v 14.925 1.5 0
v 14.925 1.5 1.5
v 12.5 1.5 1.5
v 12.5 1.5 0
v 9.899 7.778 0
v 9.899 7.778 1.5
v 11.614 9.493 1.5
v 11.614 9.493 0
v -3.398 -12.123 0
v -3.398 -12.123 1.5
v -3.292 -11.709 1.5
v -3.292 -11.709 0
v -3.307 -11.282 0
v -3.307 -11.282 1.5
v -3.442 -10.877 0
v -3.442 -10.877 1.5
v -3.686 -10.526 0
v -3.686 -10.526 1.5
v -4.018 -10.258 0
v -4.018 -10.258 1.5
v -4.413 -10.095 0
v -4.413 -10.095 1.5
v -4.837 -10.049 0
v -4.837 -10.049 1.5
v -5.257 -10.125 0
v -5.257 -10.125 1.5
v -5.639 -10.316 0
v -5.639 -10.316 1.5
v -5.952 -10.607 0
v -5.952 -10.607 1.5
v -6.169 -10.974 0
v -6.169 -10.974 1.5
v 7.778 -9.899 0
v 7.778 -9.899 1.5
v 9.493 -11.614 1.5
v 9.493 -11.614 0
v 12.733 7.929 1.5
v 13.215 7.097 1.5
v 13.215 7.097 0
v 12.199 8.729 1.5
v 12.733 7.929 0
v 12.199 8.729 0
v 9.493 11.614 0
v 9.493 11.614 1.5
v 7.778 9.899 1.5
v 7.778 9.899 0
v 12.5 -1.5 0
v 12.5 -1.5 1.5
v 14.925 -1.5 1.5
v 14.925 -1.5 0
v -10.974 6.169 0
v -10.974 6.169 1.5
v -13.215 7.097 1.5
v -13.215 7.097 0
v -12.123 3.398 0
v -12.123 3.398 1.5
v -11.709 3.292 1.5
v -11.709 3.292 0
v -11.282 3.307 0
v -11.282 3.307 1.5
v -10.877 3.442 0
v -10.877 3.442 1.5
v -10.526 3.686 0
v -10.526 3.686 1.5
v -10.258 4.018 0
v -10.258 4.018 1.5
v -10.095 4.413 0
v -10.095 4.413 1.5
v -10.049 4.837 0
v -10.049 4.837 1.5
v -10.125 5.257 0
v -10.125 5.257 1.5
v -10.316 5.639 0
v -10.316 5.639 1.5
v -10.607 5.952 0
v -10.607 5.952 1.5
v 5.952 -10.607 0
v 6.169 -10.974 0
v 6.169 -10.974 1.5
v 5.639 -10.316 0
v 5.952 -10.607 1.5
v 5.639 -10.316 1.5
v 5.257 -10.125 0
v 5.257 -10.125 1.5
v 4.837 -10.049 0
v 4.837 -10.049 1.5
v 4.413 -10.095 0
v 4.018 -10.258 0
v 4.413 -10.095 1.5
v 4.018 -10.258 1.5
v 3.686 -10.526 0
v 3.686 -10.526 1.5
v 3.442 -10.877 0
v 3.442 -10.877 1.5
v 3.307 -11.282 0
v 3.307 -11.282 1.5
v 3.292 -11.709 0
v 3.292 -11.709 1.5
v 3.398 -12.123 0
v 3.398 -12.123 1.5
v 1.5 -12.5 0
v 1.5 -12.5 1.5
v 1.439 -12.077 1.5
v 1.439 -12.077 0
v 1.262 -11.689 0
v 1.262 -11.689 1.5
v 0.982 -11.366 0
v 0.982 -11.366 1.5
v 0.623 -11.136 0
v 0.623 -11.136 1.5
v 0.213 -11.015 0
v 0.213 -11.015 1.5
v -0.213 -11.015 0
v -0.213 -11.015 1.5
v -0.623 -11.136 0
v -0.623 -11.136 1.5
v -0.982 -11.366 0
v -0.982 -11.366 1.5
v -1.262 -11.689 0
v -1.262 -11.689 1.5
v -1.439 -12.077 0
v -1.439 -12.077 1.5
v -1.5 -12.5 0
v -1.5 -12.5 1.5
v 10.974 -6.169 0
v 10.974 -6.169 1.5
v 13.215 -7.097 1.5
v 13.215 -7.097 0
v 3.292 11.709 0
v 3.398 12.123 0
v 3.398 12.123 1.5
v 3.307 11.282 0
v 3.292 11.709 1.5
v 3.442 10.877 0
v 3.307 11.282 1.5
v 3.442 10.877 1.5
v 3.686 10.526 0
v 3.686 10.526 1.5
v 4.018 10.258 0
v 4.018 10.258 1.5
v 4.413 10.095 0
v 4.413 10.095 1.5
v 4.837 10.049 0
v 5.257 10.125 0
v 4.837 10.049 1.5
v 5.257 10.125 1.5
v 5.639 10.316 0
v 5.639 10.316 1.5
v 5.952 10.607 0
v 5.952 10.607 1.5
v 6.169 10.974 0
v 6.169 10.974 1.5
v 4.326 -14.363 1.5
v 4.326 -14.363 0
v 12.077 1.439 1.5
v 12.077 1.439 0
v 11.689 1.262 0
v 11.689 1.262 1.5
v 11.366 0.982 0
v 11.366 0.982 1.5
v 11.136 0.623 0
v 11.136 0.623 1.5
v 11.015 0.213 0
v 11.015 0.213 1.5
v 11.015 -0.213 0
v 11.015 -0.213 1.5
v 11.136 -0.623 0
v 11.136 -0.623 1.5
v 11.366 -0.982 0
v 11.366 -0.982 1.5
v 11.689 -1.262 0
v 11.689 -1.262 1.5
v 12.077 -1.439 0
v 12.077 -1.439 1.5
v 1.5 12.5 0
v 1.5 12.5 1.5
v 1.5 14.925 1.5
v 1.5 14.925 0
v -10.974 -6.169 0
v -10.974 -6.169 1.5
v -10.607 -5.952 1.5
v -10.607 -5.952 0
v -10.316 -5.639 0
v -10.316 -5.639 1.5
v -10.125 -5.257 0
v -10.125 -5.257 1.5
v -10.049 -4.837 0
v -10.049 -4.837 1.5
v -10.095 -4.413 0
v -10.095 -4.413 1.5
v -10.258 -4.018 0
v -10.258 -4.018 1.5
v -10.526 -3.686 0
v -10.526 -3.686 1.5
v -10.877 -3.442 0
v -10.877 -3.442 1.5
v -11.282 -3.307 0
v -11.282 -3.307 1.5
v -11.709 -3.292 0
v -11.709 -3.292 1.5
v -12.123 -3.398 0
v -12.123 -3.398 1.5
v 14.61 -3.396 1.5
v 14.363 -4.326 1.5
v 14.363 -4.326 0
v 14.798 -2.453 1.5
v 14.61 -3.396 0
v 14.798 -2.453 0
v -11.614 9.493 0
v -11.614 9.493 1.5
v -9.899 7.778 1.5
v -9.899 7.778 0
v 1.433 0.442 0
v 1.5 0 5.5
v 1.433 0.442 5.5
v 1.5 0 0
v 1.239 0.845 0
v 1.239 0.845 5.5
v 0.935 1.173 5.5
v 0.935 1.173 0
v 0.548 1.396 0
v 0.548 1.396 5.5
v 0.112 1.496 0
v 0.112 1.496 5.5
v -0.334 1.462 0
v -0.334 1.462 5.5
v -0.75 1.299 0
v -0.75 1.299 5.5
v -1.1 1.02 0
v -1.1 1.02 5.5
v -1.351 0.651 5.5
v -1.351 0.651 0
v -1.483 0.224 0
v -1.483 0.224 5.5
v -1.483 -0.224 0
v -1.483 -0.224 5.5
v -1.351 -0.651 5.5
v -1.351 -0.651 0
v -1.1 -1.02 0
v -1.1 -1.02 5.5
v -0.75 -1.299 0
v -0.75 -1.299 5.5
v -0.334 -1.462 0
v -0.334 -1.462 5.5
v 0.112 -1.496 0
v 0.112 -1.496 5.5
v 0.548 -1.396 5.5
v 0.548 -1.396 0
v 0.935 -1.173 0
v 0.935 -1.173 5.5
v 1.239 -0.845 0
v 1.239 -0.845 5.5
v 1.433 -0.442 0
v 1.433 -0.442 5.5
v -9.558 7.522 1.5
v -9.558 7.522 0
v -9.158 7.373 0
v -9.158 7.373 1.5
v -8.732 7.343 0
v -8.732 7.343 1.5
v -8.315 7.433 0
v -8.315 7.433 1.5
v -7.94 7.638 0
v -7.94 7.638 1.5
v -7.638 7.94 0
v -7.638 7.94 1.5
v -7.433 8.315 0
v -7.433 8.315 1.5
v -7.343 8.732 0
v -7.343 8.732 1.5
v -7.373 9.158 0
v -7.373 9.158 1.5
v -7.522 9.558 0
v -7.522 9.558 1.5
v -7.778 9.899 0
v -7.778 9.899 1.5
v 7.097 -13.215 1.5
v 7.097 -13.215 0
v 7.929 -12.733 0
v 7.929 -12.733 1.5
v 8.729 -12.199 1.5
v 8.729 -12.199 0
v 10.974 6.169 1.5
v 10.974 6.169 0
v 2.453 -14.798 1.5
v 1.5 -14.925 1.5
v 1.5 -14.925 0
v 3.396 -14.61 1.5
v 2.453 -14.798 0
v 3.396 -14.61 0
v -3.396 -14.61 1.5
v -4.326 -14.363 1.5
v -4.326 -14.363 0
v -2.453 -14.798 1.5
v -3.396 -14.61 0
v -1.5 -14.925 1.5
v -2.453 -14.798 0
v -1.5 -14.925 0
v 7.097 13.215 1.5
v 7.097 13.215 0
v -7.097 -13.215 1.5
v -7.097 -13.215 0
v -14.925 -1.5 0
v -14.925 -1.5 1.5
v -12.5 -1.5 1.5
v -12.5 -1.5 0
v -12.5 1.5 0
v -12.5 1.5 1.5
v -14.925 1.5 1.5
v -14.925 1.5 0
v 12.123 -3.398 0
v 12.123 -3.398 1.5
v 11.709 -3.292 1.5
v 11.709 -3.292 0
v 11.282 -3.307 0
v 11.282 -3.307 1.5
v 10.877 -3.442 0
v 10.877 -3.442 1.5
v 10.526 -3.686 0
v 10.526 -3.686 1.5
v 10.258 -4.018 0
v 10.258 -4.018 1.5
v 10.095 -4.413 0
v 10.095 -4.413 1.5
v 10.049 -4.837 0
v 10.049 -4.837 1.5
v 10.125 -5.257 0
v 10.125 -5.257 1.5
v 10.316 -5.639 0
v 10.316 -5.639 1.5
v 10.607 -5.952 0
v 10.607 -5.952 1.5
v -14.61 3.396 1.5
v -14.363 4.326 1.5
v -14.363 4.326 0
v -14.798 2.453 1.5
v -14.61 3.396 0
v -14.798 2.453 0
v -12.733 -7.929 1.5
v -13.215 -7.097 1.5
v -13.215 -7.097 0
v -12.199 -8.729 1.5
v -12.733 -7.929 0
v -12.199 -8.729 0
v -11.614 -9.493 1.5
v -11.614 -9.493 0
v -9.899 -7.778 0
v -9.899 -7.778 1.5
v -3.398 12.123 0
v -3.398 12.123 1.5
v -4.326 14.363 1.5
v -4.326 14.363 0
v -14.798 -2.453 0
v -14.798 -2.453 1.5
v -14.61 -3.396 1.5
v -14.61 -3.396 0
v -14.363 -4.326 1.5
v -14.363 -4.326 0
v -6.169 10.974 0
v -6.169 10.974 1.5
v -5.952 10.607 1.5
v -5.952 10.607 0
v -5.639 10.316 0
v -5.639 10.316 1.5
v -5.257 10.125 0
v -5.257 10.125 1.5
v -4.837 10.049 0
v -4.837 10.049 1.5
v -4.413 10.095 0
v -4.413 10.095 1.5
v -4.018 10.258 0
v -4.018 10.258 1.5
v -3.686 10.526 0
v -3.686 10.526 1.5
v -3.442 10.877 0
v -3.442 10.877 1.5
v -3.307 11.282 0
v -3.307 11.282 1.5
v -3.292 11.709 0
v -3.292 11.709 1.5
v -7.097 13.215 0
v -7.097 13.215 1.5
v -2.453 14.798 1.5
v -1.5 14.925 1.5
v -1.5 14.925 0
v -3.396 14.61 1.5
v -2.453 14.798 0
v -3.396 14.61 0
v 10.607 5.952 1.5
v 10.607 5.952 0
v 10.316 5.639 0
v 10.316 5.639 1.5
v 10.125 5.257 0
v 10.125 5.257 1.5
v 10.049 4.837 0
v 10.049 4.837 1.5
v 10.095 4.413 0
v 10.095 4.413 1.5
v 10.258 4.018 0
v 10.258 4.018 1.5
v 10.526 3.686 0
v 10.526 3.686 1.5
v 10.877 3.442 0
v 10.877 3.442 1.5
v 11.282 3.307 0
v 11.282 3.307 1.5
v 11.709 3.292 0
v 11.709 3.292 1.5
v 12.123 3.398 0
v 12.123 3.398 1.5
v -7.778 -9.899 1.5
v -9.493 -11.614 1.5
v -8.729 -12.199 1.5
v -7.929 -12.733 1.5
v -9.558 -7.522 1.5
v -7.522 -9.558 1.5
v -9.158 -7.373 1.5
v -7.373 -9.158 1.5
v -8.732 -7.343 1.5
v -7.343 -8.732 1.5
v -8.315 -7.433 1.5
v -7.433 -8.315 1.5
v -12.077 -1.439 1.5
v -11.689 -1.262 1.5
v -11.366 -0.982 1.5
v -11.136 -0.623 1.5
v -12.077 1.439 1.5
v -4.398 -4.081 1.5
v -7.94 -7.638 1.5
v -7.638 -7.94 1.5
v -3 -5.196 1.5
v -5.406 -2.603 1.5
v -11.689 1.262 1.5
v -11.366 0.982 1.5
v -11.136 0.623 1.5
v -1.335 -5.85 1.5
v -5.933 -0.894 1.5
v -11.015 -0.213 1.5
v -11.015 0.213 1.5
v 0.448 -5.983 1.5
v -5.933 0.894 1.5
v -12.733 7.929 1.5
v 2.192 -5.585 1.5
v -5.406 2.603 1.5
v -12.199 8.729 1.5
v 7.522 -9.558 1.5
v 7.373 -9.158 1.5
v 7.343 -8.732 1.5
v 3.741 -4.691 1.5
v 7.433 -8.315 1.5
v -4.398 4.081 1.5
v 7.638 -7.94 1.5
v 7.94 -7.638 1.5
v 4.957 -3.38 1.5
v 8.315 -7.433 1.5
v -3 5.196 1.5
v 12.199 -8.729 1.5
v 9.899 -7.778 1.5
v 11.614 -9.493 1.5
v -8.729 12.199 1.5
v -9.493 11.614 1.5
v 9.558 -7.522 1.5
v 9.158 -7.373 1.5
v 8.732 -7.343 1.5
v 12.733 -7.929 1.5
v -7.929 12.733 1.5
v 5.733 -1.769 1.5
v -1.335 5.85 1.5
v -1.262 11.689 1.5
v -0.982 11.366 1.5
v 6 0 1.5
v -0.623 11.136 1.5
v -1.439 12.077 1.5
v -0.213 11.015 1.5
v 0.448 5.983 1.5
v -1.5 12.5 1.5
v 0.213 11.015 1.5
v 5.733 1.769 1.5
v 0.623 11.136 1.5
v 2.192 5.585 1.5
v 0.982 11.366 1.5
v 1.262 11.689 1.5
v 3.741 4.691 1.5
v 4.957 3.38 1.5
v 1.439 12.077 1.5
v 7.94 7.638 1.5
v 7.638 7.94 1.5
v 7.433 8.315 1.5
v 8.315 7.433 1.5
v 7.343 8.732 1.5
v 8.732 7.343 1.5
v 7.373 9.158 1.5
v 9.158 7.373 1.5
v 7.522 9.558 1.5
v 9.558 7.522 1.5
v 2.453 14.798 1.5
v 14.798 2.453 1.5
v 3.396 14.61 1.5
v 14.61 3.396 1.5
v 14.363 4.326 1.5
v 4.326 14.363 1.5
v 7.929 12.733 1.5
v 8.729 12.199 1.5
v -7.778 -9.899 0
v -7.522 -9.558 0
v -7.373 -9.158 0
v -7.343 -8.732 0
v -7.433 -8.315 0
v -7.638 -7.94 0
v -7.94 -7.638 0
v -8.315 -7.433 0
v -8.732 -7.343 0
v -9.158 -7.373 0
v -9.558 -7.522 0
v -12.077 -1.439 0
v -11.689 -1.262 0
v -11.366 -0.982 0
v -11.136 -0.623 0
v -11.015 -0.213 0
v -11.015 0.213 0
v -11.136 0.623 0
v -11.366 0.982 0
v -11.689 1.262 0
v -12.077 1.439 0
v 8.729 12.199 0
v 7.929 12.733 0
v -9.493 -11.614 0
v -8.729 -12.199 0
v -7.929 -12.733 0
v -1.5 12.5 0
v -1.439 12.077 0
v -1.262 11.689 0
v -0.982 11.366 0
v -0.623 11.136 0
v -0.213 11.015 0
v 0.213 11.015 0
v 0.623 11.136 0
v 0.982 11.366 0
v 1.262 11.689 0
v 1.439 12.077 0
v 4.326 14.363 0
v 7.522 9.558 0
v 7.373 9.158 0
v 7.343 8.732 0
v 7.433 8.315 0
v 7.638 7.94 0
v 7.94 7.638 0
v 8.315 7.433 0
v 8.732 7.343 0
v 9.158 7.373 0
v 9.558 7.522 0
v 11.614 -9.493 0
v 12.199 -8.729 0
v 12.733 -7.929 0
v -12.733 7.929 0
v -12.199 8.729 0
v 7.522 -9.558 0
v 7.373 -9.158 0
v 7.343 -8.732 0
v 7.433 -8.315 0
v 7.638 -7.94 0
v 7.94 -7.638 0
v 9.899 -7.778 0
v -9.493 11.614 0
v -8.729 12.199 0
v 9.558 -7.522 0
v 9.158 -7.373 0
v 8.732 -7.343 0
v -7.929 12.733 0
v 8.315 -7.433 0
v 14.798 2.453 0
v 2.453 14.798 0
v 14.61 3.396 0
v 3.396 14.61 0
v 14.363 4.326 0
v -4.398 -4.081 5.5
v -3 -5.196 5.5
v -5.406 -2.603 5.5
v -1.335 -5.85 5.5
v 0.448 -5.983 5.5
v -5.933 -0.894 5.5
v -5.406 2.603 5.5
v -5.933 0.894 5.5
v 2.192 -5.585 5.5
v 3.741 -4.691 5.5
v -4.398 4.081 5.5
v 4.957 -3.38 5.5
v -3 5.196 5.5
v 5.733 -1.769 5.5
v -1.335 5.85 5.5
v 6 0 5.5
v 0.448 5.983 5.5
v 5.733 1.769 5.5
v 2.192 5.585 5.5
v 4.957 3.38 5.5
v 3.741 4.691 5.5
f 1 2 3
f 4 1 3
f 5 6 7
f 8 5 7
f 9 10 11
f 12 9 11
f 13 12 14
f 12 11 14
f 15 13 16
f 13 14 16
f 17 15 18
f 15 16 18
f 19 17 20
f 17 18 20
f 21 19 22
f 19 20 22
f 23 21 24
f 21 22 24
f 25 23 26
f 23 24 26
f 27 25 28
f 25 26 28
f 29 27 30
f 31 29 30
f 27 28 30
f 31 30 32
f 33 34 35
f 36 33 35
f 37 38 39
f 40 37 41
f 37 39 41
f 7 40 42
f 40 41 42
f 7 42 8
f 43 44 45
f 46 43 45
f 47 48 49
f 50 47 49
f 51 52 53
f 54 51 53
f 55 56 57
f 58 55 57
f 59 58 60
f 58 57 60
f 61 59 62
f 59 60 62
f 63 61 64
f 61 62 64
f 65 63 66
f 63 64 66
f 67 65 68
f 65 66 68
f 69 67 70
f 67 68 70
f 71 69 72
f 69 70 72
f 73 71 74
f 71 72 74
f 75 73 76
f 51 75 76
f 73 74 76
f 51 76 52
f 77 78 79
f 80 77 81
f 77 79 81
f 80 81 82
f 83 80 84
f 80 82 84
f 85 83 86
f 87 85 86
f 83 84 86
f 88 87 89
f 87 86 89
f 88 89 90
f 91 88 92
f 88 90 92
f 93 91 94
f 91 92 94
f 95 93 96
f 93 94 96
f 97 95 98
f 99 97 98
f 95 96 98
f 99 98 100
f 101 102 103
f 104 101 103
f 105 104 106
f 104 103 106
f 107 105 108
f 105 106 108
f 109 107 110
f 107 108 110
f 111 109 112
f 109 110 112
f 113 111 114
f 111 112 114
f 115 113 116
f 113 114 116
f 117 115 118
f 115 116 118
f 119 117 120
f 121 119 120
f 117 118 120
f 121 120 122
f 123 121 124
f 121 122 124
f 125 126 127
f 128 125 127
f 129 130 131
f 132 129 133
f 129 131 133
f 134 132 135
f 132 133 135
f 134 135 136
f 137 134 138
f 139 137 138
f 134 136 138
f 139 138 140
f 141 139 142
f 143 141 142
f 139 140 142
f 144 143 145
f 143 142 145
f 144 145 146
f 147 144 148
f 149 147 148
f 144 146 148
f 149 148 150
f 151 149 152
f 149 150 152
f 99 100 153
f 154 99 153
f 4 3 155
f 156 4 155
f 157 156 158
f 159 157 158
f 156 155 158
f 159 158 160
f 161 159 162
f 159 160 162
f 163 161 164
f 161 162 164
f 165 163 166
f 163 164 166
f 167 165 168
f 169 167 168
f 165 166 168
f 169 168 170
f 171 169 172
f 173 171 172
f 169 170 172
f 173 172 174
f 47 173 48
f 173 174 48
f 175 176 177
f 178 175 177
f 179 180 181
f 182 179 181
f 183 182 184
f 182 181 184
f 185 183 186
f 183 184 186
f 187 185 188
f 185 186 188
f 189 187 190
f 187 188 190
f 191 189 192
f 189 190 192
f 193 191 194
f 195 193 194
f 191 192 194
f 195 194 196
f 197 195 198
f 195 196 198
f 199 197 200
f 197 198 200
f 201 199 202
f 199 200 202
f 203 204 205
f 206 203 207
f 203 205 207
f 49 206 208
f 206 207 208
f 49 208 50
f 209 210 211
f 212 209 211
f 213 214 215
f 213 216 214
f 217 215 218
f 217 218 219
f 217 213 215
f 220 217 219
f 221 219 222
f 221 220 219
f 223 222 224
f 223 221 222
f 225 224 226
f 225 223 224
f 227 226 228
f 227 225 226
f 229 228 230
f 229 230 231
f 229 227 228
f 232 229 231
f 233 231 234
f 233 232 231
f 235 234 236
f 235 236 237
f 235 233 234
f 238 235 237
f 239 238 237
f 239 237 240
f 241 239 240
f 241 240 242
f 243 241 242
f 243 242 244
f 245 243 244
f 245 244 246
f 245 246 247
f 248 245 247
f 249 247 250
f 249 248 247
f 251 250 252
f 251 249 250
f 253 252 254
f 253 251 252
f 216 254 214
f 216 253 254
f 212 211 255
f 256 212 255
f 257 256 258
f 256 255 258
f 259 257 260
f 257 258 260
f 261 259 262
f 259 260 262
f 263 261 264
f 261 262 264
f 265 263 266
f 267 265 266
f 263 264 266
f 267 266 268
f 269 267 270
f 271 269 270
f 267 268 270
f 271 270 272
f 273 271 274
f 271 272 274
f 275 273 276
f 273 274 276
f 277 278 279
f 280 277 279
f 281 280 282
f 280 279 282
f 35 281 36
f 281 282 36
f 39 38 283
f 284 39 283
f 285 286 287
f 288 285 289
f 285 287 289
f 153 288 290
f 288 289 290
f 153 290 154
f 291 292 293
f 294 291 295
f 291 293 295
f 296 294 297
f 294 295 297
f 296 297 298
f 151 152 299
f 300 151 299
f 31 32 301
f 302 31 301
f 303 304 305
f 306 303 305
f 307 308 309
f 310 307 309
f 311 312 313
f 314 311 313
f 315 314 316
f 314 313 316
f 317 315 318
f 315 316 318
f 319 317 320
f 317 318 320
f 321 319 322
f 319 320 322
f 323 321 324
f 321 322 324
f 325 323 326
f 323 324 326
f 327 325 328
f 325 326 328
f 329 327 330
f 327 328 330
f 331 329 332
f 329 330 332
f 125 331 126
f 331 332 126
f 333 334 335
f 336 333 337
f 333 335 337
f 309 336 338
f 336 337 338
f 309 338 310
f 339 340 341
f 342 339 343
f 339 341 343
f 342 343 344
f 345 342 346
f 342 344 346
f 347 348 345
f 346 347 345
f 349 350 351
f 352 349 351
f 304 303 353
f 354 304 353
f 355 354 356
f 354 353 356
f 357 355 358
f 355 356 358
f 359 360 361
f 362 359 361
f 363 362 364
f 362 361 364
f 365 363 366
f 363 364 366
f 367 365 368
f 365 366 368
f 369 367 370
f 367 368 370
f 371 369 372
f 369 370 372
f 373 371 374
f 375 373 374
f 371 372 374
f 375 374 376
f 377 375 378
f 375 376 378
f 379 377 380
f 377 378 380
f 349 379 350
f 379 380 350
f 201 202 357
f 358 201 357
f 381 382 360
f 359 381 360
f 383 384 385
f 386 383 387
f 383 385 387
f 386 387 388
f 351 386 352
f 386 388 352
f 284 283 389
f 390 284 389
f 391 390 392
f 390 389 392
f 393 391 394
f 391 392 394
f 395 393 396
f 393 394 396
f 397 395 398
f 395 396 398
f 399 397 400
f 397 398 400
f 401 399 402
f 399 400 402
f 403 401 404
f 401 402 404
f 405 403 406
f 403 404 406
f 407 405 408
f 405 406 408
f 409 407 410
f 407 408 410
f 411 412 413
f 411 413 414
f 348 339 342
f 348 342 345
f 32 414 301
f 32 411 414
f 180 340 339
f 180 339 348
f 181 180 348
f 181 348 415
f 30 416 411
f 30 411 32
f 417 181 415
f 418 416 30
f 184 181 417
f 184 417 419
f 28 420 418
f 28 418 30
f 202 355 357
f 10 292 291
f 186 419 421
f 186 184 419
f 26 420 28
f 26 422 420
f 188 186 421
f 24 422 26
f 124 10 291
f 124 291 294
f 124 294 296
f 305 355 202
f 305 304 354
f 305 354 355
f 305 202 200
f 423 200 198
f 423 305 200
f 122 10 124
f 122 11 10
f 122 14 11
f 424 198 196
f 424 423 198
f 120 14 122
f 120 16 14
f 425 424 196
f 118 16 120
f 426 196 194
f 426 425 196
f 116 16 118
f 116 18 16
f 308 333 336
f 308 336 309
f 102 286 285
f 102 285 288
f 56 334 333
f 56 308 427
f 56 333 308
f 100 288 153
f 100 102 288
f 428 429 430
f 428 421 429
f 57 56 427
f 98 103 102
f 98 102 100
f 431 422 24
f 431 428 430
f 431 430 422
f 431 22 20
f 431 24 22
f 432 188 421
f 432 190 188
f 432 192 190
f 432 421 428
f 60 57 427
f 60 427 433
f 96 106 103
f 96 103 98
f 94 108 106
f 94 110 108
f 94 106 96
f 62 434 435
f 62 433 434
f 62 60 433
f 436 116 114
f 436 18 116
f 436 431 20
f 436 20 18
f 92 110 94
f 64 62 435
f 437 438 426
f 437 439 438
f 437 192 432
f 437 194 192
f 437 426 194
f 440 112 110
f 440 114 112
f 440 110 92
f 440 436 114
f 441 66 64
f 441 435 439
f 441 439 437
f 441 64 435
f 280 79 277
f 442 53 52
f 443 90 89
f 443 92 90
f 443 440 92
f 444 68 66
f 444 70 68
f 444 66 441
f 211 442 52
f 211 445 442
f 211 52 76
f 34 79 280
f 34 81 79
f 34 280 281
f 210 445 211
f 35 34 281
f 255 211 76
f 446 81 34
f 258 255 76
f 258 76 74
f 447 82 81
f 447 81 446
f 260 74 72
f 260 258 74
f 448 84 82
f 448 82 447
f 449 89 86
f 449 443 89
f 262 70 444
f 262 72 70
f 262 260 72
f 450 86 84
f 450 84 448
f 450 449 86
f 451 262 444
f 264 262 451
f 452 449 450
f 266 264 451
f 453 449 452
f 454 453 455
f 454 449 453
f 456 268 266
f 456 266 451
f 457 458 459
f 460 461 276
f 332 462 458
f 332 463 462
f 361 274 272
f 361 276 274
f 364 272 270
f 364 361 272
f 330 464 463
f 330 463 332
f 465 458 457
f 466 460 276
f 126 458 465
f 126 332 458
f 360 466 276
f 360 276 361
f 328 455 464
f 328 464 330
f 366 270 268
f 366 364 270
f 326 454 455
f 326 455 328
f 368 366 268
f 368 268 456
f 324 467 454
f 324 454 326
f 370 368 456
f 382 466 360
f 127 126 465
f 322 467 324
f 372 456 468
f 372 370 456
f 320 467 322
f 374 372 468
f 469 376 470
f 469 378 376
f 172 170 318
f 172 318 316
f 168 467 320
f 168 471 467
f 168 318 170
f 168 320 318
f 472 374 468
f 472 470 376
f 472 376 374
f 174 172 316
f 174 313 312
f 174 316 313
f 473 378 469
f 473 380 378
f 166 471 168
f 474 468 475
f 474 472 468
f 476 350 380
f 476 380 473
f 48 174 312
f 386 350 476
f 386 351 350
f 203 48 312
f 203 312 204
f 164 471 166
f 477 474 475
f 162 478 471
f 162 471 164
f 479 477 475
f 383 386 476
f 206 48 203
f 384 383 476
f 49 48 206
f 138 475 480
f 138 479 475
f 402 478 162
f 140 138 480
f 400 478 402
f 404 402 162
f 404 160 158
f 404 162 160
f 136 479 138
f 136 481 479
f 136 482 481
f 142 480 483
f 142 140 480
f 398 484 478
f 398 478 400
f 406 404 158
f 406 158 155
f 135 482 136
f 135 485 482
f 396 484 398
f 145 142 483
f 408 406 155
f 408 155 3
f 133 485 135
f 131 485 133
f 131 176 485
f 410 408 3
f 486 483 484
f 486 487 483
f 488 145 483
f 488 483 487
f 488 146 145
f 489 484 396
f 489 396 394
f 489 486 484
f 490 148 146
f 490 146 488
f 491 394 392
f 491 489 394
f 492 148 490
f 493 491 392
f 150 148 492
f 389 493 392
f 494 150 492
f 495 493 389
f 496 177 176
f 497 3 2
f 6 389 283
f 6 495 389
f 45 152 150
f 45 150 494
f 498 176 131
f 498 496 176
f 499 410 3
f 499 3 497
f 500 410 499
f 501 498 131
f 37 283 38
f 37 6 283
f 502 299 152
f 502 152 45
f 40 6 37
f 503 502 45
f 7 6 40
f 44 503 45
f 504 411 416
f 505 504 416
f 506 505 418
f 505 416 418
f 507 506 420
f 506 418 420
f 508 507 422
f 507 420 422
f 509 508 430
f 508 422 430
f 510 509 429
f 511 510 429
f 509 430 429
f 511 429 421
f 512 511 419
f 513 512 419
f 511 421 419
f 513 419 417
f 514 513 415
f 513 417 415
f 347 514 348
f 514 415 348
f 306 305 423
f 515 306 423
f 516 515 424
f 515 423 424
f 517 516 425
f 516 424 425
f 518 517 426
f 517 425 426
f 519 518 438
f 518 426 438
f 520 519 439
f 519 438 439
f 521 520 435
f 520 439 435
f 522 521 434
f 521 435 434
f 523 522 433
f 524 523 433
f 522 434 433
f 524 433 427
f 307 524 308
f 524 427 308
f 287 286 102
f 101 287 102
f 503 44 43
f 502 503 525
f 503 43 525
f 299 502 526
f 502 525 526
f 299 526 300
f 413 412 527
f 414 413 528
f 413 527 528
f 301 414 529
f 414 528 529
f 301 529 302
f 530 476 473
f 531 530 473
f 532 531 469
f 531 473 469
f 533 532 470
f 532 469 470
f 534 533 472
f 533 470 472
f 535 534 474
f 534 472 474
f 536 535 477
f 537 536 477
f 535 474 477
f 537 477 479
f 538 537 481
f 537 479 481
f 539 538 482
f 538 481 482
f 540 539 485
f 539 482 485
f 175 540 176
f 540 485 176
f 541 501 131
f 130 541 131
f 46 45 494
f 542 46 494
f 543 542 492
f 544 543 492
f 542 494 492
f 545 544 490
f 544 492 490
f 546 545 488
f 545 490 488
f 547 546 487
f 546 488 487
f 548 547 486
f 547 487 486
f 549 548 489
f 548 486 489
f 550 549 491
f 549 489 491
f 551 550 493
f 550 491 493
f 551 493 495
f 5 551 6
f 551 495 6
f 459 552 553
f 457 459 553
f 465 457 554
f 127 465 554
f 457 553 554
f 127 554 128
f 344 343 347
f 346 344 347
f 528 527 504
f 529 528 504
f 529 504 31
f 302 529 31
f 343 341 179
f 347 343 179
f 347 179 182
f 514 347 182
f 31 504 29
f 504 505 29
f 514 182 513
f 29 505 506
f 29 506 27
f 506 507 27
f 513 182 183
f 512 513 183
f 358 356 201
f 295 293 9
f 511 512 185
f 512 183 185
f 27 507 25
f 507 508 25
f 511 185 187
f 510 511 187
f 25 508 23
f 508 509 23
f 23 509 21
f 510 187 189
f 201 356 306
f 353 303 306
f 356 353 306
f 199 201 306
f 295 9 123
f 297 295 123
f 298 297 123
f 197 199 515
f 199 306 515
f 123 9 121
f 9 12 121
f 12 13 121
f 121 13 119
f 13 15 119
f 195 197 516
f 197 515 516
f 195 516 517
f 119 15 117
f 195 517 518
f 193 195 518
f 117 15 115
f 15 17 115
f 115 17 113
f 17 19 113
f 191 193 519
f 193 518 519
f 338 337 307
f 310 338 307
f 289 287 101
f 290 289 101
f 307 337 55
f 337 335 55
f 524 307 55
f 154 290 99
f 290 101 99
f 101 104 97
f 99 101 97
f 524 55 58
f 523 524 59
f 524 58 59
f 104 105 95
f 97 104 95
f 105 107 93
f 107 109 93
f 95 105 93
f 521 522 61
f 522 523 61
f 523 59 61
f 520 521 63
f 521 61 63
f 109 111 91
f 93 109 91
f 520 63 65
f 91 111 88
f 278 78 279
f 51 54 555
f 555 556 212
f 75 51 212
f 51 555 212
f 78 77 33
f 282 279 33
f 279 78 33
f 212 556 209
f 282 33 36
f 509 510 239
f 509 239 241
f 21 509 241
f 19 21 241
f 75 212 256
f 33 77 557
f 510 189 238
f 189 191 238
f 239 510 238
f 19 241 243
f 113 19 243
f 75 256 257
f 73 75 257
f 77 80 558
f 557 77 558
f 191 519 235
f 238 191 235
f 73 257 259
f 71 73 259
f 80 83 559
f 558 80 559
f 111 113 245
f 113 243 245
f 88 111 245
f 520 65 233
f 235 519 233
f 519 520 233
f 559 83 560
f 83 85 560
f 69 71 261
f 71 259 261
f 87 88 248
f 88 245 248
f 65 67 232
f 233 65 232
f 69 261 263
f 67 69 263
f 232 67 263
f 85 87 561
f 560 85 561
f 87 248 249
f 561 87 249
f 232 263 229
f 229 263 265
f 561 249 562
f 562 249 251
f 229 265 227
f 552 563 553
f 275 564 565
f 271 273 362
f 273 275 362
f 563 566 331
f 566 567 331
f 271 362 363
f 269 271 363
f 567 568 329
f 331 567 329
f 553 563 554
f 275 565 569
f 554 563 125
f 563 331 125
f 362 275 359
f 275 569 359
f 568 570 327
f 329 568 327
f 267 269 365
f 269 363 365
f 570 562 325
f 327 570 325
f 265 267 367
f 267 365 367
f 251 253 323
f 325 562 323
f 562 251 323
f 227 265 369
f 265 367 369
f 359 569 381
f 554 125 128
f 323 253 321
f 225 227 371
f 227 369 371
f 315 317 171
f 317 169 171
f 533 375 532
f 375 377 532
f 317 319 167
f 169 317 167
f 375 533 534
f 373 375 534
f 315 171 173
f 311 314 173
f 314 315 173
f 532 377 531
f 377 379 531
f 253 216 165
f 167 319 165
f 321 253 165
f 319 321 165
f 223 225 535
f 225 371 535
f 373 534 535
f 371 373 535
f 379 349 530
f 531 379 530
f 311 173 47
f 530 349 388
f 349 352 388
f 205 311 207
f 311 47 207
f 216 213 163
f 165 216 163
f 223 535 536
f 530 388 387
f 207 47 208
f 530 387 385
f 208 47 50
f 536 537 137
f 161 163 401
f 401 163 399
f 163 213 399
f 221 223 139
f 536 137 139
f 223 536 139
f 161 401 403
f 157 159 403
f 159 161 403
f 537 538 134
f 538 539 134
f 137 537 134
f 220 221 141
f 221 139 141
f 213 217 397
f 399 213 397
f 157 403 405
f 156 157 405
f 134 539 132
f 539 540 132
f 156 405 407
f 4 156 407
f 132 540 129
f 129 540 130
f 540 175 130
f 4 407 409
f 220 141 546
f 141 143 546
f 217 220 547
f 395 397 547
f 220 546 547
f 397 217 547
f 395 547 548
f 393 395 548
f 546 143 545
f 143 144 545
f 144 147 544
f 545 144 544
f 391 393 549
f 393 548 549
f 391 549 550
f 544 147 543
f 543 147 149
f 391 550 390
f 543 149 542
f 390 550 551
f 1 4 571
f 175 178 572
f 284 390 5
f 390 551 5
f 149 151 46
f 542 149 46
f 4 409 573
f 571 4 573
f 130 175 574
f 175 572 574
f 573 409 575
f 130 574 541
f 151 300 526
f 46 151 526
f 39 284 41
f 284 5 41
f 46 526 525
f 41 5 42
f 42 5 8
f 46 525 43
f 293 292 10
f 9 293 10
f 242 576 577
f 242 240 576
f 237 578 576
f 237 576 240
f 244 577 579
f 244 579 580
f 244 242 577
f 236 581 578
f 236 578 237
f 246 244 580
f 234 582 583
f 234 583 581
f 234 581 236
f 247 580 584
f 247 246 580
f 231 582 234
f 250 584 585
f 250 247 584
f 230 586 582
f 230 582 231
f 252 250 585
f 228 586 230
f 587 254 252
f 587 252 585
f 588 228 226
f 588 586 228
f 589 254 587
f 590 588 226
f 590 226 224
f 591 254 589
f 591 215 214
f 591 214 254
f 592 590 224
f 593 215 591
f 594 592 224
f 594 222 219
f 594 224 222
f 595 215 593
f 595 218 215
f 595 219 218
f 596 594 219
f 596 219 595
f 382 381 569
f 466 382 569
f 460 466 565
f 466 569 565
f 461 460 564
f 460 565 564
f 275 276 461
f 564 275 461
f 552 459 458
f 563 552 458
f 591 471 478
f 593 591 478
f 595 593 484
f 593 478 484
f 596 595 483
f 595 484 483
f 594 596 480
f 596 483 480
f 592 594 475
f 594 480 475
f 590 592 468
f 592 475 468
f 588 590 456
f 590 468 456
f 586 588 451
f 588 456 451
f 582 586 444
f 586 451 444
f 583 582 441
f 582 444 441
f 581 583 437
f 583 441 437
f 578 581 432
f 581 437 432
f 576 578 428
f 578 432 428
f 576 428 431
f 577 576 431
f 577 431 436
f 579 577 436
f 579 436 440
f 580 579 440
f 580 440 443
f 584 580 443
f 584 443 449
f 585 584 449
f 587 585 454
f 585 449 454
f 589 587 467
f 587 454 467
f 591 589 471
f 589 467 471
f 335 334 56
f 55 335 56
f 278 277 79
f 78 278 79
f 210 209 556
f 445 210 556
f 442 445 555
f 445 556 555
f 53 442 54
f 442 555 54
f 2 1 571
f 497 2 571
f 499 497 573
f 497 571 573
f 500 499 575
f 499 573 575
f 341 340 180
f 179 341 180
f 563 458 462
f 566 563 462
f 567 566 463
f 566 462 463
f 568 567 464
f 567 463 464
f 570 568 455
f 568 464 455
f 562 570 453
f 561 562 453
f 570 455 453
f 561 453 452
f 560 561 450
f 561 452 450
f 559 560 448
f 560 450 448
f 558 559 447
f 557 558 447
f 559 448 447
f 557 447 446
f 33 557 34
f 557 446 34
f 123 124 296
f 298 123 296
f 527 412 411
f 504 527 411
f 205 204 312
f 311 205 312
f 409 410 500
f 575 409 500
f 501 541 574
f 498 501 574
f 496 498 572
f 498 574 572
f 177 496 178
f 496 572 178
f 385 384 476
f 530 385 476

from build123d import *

# Parameters (mm, degrees)
SKETCH1_R           = 15
SKETCH1_R_2         = 1.5
BOSS_EXTRUDE1_DEPTH = 1.5
SKETCH2_R           = 6
SKETCH2_R_2         = 1.5
BOSS_EXTRUDE2_DEPTH = 4
CUT_EXTRUDE3_DEPTH  = 22.587033145


with BuildPart() as part:
    # Sketch1 → Boss-Extrude1 (new body)
    with BuildSketch(Plane.XY):
        Circle(SKETCH1_R)
        Circle(SKETCH1_R_2, mode=Mode.SUBTRACT)
    extrude(amount=BOSS_EXTRUDE1_DEPTH)

    # Sketch2 → Boss-Extrude2 (add)
    with BuildSketch(Plane.XY.offset(1.5)):
        Circle(SKETCH2_R)
        Circle(SKETCH2_R_2, mode=Mode.SUBTRACT)
    extrude(amount=BOSS_EXTRUDE2_DEPTH)

    # Sketch3 → Cut-Extrude3 (cut, through all)
    with BuildSketch(Plane.XY.offset(1.5)):
        with BuildLine():
            Line((-1.5, 14.924811557), (-1.5, 12.5))
            ThreePointArc((-1.5, 12.5), (0, 11), (1.5, 12.5))
            Line((1.5, 12.5), (1.5, 14.924811557))
            ThreePointArc((1.5, 14.924811557), (0, 15), (-1.5, 14.924811557))
        make_face()
        with BuildLine():
            ThreePointArc((7.097297413, 13.214702775), (5.740251485, 13.858192988), (4.325658815, 14.362753072))
            Line((4.325658815, 14.362753072), (3.397723606, 12.122519305))
            ThreePointArc((3.397723606, 12.122519305), (4.209517756, 10.162674858), (6.169362203, 10.974469008))
            Line((6.169362203, 10.974469008), (7.097297413, 13.214702775))
        make_face()
        with BuildLine():
            Line((-3.397723606, 12.122519305), (-4.325658815, 14.362753072))
            ThreePointArc((-4.325658815, 14.362753072), (-5.740251485, 13.858192988), (-7.097297413, 13.214702775))
            Line((-7.097297413, 13.214702775), (-6.169362203, 10.974469008))
            ThreePointArc((-6.169362203, 10.974469008), (-4.209517756, 10.162674858), (-3.397723606, 12.122519305))
        make_face()
        with BuildLine():
            ThreePointArc((11.614095631, 9.492775288), (10.606601718, 10.606601718), (9.492775288, 11.614095631))
            Line((9.492775288, 11.614095631), (7.778174593, 9.899494937))
            ThreePointArc((7.778174593, 9.899494937), (7.778174593, 7.778174593), (9.899494937, 7.778174593))
            Line((9.899494937, 7.778174593), (11.614095631, 9.492775288))
        make_face()
        with BuildLine():
            Line((-7.778174593, 9.899494937), (-9.492775288, 11.614095631))
            ThreePointArc((-9.492775288, 11.614095631), (-10.606601718, 10.606601718), (-11.614095631, 9.492775288))
            Line((-11.614095631, 9.492775288), (-9.899494937, 7.778174593))
            ThreePointArc((-9.899494937, 7.778174593), (-7.778174593, 7.778174593), (-7.778174593, 9.899494937))
        make_face()
        with BuildLine():
            ThreePointArc((14.362753072, 4.325658815), (13.858192988, 5.740251485), (13.214702775, 7.097297413))
            Line((13.214702775, 7.097297413), (10.974469008, 6.169362203))
            ThreePointArc((10.974469008, 6.169362203), (10.162674858, 4.209517756), (12.122519305, 3.397723606))
            Line((12.122519305, 3.397723606), (14.362753072, 4.325658815))
        make_face()
        with BuildLine():
            Line((-10.974469008, 6.169362203), (-13.214702775, 7.097297413))
            ThreePointArc((-13.214702775, 7.097297413), (-13.858192988, 5.740251485), (-14.362753072, 4.325658815))
            Line((-14.362753072, 4.325658815), (-12.122519305, 3.397723606))
            ThreePointArc((-12.122519305, 3.397723606), (-10.162674858, 4.209517756), (-10.974469008, 6.169362203))
        make_face()
        with BuildLine():
            Line((14.924811557, 1.5), (12.5, 1.5))
            ThreePointArc((12.5, 1.5), (11, 0), (12.5, -1.5))
            Line((12.5, -1.5), (14.924811557, -1.5))
            ThreePointArc((14.924811557, -1.5), (15, 0), (14.924811557, 1.5))
        make_face()
        with BuildLine():
            Line((-12.5, 1.5), (-14.924811557, 1.5))
            ThreePointArc((-14.924811557, 1.5), (-15, 0), (-14.924811557, -1.5))
            Line((-14.924811557, -1.5), (-12.5, -1.5))
            ThreePointArc((-12.5, -1.5), (-11, 0), (-12.5, 1.5))
        make_face()
        with BuildLine():
            ThreePointArc((13.214702775, -7.097297413), (13.858192988, -5.740251485), (14.362753072, -4.325658815))
            Line((14.362753072, -4.325658815), (12.122519305, -3.397723606))
            ThreePointArc((12.122519305, -3.397723606), (10.162674858, -4.209517756), (10.974469008, -6.169362203))
            Line((10.974469008, -6.169362203), (13.214702775, -7.097297413))
        make_face()
        with BuildLine():
            Line((-12.122519305, -3.397723606), (-14.362753072, -4.325658815))
            ThreePointArc((-14.362753072, -4.325658815), (-13.858192988, -5.740251485), (-13.214702775, -7.097297413))
            Line((-13.214702775, -7.097297413), (-10.974469008, -6.169362203))
            ThreePointArc((-10.974469008, -6.169362203), (-10.162674858, -4.209517756), (-12.122519305, -3.397723606))
        make_face()
        with BuildLine():
            ThreePointArc((9.492775288, -11.614095631), (10.606601718, -10.606601718), (11.614095631, -9.492775288))
            Line((11.614095631, -9.492775288), (9.899494937, -7.778174593))
            ThreePointArc((9.899494937, -7.778174593), (7.778174593, -7.778174593), (7.778174593, -9.899494937))
            Line((7.778174593, -9.899494937), (9.492775288, -11.614095631))
        make_face()
        with BuildLine():
            Line((-9.899494937, -7.778174593), (-11.614095631, -9.492775288))
            ThreePointArc((-11.614095631, -9.492775288), (-10.606601718, -10.606601718), (-9.492775288, -11.614095631))
            Line((-9.492775288, -11.614095631), (-7.778174593, -9.899494937))
            ThreePointArc((-7.778174593, -9.899494937), (-7.778174593, -7.778174593), (-9.899494937, -7.778174593))
        make_face()
        with BuildLine():
            ThreePointArc((4.325658815, -14.362753072), (5.740251485, -13.858192988), (7.097297413, -13.214702775))
            Line((7.097297413, -13.214702775), (6.169362203, -10.974469008))
            ThreePointArc((6.169362203, -10.974469008), (4.209517756, -10.162674858), (3.397723606, -12.122519305))
            Line((3.397723606, -12.122519305), (4.325658815, -14.362753072))
        make_face()
        with BuildLine():
            Line((-6.169362203, -10.974469008), (-7.097297413, -13.214702775))
            ThreePointArc((-7.097297413, -13.214702775), (-5.740251485, -13.858192988), (-4.325658815, -14.362753072))
            Line((-4.325658815, -14.362753072), (-3.397723606, -12.122519305))
            ThreePointArc((-3.397723606, -12.122519305), (-4.209517756, -10.162674858), (-6.169362203, -10.974469008))
        make_face()
        with BuildLine():
            ThreePointArc((-1.5, -14.924811557), (0, -15), (1.5, -14.924811557))
            Line((1.5, -14.924811557), (1.5, -12.5))
            ThreePointArc((1.5, -12.5), (0, -11), (-1.5, -12.5))
            Line((-1.5, -12.5), (-1.5, -14.924811557))
        make_face()
    extrude(amount=-CUT_EXTRUDE3_DEPTH, mode=Mode.SUBTRACT)


solid = part.part
